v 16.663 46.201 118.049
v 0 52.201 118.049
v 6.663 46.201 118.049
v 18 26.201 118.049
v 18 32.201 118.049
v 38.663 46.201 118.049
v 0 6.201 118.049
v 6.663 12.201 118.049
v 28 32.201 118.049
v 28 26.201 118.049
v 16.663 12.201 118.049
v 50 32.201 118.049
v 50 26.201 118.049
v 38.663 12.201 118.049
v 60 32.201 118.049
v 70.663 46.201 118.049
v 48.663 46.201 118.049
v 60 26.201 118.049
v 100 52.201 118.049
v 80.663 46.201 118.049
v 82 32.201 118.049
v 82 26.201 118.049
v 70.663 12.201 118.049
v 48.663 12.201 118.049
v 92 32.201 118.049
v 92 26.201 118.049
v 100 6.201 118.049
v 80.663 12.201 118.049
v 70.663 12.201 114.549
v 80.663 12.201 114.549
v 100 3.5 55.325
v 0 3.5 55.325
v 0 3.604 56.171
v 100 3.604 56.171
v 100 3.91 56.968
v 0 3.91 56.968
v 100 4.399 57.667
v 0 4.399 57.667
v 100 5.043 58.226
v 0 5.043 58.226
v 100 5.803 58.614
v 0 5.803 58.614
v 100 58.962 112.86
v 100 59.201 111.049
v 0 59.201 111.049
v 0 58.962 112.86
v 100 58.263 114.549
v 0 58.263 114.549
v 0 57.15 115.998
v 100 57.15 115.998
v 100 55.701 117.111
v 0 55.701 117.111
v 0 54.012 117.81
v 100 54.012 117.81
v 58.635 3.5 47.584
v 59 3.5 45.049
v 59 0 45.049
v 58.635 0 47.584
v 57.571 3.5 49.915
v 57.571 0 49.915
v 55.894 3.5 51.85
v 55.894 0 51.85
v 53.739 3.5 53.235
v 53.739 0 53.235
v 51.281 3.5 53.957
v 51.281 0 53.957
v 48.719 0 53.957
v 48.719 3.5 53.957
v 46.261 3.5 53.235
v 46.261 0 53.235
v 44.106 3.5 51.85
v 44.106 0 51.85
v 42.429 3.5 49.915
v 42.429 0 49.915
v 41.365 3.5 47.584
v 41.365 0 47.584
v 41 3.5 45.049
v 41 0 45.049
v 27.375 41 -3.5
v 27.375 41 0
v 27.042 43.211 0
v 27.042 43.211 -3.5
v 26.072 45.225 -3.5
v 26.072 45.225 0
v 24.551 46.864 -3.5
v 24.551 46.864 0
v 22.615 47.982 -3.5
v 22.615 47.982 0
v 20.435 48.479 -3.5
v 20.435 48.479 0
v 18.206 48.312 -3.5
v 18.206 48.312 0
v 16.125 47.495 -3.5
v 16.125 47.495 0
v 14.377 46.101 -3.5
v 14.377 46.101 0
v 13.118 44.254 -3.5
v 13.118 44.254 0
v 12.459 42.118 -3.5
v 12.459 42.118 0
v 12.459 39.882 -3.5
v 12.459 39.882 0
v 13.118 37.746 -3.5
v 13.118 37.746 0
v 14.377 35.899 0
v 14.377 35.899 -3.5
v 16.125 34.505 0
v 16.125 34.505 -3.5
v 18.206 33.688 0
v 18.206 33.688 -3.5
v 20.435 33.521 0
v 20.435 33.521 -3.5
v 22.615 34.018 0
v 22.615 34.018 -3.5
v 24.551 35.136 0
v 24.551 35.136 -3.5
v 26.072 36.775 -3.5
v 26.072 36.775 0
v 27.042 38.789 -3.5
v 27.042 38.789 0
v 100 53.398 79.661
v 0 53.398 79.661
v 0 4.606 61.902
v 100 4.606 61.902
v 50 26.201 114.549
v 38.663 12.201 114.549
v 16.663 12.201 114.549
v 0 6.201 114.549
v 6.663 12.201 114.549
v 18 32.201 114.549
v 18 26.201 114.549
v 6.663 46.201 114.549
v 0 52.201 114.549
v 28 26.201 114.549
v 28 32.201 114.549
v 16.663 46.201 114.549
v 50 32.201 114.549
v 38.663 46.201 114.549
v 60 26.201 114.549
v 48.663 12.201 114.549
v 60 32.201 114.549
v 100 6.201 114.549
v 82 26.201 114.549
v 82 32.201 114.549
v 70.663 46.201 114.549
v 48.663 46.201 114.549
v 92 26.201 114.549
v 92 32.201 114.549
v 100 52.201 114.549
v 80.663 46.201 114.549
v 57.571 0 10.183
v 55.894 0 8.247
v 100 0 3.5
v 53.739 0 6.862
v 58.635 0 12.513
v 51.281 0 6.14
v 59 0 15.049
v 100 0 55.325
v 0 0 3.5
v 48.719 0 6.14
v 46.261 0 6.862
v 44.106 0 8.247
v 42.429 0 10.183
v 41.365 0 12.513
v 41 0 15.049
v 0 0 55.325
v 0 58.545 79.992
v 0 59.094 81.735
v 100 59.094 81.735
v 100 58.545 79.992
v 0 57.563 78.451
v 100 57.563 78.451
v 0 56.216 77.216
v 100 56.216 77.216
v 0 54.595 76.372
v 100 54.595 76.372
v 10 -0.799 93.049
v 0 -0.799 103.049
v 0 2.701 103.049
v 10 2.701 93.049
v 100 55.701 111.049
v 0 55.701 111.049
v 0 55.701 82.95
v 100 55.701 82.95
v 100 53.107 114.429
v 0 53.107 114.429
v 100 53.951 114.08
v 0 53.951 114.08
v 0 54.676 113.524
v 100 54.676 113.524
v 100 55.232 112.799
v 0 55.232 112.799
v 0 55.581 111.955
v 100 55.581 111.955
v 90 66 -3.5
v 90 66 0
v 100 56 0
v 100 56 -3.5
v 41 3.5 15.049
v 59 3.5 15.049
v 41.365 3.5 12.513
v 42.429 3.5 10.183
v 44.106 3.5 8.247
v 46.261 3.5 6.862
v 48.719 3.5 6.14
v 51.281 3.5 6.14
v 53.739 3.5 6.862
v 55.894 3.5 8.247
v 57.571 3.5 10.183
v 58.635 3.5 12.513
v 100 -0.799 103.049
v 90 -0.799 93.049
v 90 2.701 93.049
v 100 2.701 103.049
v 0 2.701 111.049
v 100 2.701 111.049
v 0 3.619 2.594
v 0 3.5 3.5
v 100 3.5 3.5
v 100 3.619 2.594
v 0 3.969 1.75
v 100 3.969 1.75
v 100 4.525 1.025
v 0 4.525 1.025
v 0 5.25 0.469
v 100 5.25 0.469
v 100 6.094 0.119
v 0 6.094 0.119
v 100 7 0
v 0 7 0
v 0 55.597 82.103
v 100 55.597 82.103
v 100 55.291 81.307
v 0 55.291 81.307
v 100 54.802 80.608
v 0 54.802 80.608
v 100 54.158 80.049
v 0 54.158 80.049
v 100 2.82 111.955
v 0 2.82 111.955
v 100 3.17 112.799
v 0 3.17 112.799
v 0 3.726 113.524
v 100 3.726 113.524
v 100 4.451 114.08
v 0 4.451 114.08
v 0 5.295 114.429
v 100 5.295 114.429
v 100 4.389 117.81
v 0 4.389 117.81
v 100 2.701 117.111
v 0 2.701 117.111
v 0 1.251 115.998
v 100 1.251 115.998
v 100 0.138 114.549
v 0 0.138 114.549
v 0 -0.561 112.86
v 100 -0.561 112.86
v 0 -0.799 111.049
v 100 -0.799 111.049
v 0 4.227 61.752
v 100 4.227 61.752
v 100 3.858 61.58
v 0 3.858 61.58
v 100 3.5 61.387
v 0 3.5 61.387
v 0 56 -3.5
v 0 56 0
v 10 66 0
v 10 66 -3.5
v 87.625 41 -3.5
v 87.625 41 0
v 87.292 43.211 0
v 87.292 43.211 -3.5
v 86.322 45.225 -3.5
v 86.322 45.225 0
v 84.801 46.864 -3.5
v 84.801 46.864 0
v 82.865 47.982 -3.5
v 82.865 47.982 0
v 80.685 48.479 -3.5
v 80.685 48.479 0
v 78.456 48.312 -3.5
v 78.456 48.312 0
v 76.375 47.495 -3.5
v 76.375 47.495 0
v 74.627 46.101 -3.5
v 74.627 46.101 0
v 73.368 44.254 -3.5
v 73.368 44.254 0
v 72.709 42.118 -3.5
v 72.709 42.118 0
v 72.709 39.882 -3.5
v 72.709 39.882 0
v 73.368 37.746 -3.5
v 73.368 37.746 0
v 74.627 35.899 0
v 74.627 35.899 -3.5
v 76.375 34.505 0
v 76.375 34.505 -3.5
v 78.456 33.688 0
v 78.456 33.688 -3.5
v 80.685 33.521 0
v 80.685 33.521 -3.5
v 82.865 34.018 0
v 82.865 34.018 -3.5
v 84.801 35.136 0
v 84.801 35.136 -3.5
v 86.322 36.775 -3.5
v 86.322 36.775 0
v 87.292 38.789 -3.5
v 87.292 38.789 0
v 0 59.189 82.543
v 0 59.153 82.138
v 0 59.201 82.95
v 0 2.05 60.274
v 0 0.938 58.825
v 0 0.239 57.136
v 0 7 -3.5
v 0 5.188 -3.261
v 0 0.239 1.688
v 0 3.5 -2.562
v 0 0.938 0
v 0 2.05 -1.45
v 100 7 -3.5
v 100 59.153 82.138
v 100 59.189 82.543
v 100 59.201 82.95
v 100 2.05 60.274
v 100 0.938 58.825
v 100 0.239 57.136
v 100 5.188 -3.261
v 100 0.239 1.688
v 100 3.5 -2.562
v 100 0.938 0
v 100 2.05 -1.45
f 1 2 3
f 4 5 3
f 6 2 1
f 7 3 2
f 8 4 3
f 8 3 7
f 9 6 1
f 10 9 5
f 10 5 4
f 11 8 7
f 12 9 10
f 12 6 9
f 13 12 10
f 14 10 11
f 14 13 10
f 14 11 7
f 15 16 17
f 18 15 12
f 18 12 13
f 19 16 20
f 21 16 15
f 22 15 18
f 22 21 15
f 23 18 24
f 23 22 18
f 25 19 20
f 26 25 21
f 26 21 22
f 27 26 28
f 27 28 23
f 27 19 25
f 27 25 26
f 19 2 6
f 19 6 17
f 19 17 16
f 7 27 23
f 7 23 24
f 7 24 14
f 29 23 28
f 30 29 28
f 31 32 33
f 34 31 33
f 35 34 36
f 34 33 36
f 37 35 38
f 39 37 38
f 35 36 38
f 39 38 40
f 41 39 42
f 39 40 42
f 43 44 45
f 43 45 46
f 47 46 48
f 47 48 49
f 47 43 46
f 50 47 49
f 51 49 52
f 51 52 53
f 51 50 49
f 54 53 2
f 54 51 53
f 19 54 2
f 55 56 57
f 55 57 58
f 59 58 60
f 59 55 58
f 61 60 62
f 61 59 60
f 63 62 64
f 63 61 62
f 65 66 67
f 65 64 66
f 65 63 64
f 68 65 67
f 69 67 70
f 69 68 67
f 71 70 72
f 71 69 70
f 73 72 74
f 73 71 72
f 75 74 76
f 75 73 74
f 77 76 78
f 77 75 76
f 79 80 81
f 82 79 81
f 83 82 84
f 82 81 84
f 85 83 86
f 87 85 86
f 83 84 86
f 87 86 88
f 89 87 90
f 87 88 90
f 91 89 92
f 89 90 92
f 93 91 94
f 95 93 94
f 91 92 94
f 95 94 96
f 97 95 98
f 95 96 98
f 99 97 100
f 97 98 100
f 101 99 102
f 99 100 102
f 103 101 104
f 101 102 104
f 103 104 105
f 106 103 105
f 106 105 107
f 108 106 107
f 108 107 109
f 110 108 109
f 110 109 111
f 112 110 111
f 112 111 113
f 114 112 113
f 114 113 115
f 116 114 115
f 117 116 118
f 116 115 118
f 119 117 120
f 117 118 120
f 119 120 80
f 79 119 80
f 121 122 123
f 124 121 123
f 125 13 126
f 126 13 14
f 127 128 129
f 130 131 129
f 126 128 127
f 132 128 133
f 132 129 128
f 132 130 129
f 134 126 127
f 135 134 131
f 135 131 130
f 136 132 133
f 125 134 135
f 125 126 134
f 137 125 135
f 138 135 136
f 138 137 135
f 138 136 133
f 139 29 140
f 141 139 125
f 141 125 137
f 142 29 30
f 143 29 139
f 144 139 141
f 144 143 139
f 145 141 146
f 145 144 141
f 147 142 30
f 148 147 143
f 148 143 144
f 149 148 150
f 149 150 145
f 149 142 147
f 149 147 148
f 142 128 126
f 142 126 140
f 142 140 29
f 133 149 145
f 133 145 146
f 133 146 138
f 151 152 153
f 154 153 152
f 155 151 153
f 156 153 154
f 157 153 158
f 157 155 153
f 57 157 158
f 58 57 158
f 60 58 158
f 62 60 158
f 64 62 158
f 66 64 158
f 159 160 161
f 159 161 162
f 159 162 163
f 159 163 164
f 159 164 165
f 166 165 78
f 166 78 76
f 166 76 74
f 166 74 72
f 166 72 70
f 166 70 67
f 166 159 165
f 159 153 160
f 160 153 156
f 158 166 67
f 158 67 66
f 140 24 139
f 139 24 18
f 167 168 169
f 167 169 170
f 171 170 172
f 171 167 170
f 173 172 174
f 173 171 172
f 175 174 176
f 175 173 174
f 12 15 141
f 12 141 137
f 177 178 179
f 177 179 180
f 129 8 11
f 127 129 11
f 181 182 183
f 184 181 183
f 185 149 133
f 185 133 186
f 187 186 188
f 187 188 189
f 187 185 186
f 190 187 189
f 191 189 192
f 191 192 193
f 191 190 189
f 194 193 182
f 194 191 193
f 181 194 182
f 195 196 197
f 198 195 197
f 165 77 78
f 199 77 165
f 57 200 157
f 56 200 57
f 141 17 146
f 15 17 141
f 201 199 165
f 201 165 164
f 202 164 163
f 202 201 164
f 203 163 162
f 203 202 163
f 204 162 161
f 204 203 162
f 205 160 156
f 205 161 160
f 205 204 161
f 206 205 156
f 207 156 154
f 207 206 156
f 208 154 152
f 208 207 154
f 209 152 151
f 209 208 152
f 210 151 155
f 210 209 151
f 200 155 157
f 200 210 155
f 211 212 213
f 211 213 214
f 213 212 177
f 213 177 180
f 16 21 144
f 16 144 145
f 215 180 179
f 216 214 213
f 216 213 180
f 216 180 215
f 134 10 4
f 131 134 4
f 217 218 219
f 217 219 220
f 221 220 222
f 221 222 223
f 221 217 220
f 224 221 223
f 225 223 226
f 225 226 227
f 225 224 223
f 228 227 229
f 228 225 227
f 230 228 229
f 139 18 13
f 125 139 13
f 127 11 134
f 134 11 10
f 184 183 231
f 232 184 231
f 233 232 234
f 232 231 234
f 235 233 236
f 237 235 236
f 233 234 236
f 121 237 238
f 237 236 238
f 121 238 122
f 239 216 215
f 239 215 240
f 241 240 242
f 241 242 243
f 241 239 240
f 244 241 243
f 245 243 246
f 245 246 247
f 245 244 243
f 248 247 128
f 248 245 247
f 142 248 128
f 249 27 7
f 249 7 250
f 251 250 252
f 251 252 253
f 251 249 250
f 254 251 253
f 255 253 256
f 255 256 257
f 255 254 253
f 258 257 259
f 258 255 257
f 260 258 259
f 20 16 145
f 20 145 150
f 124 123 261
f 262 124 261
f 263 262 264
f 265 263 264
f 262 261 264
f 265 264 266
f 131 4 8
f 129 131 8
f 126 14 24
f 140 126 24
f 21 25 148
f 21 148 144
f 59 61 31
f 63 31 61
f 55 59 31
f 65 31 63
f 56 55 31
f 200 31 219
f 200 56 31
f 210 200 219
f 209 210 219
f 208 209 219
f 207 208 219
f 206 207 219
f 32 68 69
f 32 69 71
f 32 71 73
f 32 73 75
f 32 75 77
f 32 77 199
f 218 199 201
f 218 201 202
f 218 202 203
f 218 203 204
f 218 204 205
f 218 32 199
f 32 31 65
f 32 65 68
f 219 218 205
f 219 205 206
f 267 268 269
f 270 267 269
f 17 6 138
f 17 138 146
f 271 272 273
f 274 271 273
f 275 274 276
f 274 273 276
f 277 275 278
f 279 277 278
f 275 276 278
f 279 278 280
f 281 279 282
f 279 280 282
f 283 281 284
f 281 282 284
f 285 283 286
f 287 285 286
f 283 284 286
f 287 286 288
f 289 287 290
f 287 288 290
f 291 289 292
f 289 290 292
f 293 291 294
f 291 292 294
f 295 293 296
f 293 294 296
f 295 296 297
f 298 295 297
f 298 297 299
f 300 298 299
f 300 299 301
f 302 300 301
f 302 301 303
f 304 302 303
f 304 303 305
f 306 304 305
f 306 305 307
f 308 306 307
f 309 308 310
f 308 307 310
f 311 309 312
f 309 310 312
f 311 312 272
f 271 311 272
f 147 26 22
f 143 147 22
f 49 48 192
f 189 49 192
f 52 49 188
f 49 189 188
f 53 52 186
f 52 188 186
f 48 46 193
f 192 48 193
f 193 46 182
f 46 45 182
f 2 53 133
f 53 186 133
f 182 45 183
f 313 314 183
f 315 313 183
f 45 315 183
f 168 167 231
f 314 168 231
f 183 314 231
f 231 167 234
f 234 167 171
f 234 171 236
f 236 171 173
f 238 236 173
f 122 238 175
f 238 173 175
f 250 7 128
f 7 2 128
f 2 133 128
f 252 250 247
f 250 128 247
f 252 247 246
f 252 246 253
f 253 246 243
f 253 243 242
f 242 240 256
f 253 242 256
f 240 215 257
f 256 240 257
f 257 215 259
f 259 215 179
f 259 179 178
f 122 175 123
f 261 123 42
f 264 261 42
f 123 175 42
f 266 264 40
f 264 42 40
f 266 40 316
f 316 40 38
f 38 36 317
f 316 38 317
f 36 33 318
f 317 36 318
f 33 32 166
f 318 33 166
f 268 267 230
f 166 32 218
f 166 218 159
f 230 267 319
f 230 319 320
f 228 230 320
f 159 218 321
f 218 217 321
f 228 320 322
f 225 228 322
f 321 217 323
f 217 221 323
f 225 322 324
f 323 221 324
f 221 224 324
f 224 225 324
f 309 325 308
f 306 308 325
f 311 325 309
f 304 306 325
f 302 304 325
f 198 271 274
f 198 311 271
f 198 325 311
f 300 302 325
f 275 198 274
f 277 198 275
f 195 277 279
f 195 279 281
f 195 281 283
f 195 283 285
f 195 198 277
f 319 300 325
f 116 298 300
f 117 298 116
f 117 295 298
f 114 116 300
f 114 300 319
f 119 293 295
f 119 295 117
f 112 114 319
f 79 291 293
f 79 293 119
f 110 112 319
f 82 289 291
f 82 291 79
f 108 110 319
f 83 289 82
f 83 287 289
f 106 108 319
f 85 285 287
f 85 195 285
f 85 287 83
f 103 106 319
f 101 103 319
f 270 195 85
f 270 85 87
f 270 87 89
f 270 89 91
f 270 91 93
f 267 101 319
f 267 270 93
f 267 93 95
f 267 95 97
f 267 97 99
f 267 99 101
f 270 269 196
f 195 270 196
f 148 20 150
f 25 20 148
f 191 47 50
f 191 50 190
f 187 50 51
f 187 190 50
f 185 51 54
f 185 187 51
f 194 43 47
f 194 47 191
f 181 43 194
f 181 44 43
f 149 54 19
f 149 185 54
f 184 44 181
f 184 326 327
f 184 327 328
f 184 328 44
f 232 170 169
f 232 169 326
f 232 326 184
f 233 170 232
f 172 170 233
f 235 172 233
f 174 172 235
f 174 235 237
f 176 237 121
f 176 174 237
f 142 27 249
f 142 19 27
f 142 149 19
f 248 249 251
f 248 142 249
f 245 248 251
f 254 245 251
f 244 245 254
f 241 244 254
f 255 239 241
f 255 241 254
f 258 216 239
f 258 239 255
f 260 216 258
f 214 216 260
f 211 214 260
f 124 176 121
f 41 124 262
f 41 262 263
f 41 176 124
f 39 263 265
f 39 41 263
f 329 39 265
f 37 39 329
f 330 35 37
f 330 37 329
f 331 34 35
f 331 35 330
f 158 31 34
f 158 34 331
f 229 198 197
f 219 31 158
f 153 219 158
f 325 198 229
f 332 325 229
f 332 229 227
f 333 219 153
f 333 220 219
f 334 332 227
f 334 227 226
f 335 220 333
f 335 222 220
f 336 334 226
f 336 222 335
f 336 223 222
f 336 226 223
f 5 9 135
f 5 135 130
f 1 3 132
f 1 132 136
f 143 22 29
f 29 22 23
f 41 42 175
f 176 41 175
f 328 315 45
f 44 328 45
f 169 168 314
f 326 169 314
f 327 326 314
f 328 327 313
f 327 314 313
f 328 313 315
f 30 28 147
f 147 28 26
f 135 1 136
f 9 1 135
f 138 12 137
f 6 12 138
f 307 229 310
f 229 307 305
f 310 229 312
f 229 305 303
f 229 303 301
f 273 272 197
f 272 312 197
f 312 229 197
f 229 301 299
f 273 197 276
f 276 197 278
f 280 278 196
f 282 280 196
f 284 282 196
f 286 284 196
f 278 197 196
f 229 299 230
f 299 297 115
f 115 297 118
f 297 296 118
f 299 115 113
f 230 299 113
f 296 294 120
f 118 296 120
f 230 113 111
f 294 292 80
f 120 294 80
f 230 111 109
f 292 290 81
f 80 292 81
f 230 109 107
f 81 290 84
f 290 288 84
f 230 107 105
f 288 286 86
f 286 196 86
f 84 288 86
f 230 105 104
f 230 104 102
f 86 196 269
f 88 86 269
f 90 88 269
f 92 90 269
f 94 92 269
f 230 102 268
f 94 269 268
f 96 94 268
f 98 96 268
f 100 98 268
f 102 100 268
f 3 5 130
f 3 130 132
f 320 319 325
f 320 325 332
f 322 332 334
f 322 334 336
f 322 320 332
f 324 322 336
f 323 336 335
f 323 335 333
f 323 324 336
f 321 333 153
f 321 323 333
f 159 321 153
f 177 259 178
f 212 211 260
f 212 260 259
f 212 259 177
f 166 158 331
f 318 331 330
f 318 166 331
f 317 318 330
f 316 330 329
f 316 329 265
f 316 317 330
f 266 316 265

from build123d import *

# Parameters (mm, degrees)
SKETCH1_R                    = 7.5
BASE_FLANGE1_DEPTH           = 3.5
EDGE_FLANGE1_STRIP_W         = 21
EDGE_FLANGE1_STRIP_H         = 3.5
EDGE_FLANGE1_STRIP_CUT_DEPTH = 100
EDGE_FLANGE1_DEPTH           = 100
EDGE_FLANGE2_DEPTH           = 100
EDGE_FLANGE2_2_DEPTH         = 100
EDGE_FLANGE3_DEPTH           = 100
EDGE_FLANGE3_2_DEPTH         = 100
EDGE_FLANGE4_STRIP_W         = 21
EDGE_FLANGE4_STRIP_H         = 3.5
EDGE_FLANGE4_STRIP_CUT_DEPTH = 100
EDGE_FLANGE4_DEPTH           = 100
EDGE_FLANGE5_STRIP_W         = 21
EDGE_FLANGE5_STRIP_H         = 3.5
EDGE_FLANGE5_STRIP_CUT_DEPTH = 100
EDGE_FLANGE5_DEPTH           = 100
BREAK_CORNER1_START          = -0.79936489
BREAK_CORNER1_DEPTH          = 3.5
CUT_EXTRUDE1_DEPTH           = 10
CUT_EXTRUDE2_DEPTH           = 10


# Read off the part's stored shape, not the designer's step: Edge-Flange2, Edge-Flange3, Break-Corner1
# Sheet-metal steps are written as plain solids
with BuildPart() as part:
    # Sketch1 → Base-Flange1 (new body)
    with BuildSketch(Plane.XY):
        Polygon((90, 66), (100, 56), (100, 0), (0, 0), (0, 56), (10, 66), align=None)
        with Locations((19.875, 41)):
            Circle(SKETCH1_R, mode=Mode.SUBTRACT)
        with Locations((80.125, 41)):
            Circle(SKETCH1_R, mode=Mode.SUBTRACT)
    extrude(amount=-BASE_FLANGE1_DEPTH)

    # Edge-Flange1 strip (across the edge) → Edge-Flange1 strip cut (cut)
    with BuildSketch(Plane.YZ):
        with Locations((-3.5, -1.75)):
            Rectangle(EDGE_FLANGE1_STRIP_W, EDGE_FLANGE1_STRIP_H)
    extrude(amount=EDGE_FLANGE1_STRIP_CUT_DEPTH, mode=Mode.SUBTRACT)

    # Edge-Flange1 section (across the edge) → Edge-Flange1 (add)
    with BuildSketch(Plane.YZ):
        with BuildLine():
            Line((0, 3.5), (0, 61.5))
            Line((0, 61.5), (3.5, 61.5))
            Line((3.5, 61.5), (3.5, 3.5))
            ThreePointArc((3.5, 3.5), (4.525126266, 1.025126266), (7, 0))
            Line((7, 0), (7, -3.5))
            ThreePointArc((7, -3.5), (2.050252532, -1.449747468), (0, 3.5))
        make_face()
    extrude(amount=EDGE_FLANGE1_DEPTH)

    # Edge-Flange2 outline → Edge-Flange2 (cut)
    with BuildSketch(Plane.YZ):
        with BuildLine():
            ThreePointArc((0, 55.324651413), (0.937822174, 58.824651413), (3.5, 61.386829239))
            Line((3.5, 61.386829239), (3.5, 61.5))
            Line((3.5, 61.5), (0, 61.5))
            Line((0, 61.5), (0, 55.324651413))
        make_face()
    extrude(amount=EDGE_FLANGE2_DEPTH, mode=Mode.SUBTRACT)

    # Edge-Flange2 2 outline → Edge-Flange2 2 (add)
    with BuildSketch(Plane.YZ):
        with BuildLine():
            Line((59.20063511, 81.77337321), (4.605858997, 61.902499758))
            ThreePointArc((4.605858997, 61.902499758), (4.041672168, 61.668805922), (3.5, 61.386829239))
            Line((3.5, 61.386829239), (3.5, 55.324651413))
            ThreePointArc((3.5, 55.324651413), (4.132967845, 57.33216894), (5.802929498, 58.613575585))
            Line((5.802929498, 58.613575585), (60.397705611, 78.484449037))
            Line((60.397705611, 78.484449037), (59.20063511, 81.77337321))
        make_face()
    extrude(amount=EDGE_FLANGE2_2_DEPTH)

    # Edge-Flange3 outline → Edge-Flange3 (cut)
    with BuildSketch(Plane.YZ):
        with BuildLine():
            Line((59.20063511, 81.77337321), (59.094289381, 81.73466653))
            ThreePointArc((59.094289381, 81.73466653), (57.562946212, 78.450690506), (54.594776113, 76.372355428))
            Line((54.594776113, 76.372355428), (60.397705611, 78.484449037))
            Line((60.397705611, 78.484449037), (59.20063511, 81.77337321))
        make_face()
    extrude(amount=EDGE_FLANGE3_DEPTH, mode=Mode.SUBTRACT)

    # Edge-Flange3 2 outline → Edge-Flange3 2 (add)
    with BuildSketch(Plane.YZ):
        with BuildLine():
            ThreePointArc((59.094289381, 81.73466653), (59.173997997, 82.340113574), (59.20063511, 82.950203773))
            Line((59.20063511, 82.950203773), (59.20063511, 118.048751006))
            Line((59.20063511, 118.048751006), (55.70063511, 118.048751006))
            Line((55.70063511, 118.048751006), (55.70063511, 82.950203773))
            ThreePointArc((55.70063511, 82.950203773), (55.067667265, 80.942686246), (53.397705611, 79.661279601))
            Line((53.397705611, 79.661279601), (59.094289381, 81.73466653))
        make_face()
    extrude(amount=EDGE_FLANGE3_2_DEPTH)

    # Edge-Flange4 strip (across the edge) → Edge-Flange4 strip cut (cut)
    with BuildSketch(Plane(origin=(100, 55.70063511, 118.048751006), x_dir=(0, 0, -1), z_dir=(-1, 0, 0))):
        with Locations((-3.5, -1.75)):
            Rectangle(EDGE_FLANGE4_STRIP_W, EDGE_FLANGE4_STRIP_H)
    extrude(amount=EDGE_FLANGE4_STRIP_CUT_DEPTH, mode=Mode.SUBTRACT)

    # Edge-Flange4 section (across the edge) → Edge-Flange4 (add)
    with BuildSketch(Plane(origin=(100, 55.70063511, 118.048751006), x_dir=(0, 0, -1), z_dir=(-1, 0, 0))):
        with BuildLine():
            Line((0, 3.5), (0, 56.5))
            Line((0, 56.5), (3.5, 56.5))
            Line((3.5, 56.5), (3.5, 3.5))
            ThreePointArc((3.5, 3.5), (4.525126266, 1.025126266), (7, 0))
            Line((7, 0), (7, -3.5))
            ThreePointArc((7, -3.5), (2.050252532, -1.449747468), (0, 3.5))
        make_face()
    extrude(amount=EDGE_FLANGE4_DEPTH)

    # Edge-Flange5 strip (across the edge) → Edge-Flange5 strip cut (cut)
    with BuildSketch(Plane(origin=(100, -0.79936489, 114.548751006), x_dir=(0, 1, 0), z_dir=(-1, 0, 0))):
        with Locations((-3.5, -1.75)):
            Rectangle(EDGE_FLANGE5_STRIP_W, EDGE_FLANGE5_STRIP_H)
    extrude(amount=EDGE_FLANGE5_STRIP_CUT_DEPTH, mode=Mode.SUBTRACT)

    # Edge-Flange5 section (across the edge) → Edge-Flange5 (add)
    with BuildSketch(Plane(origin=(100, -0.79936489, 114.548751006), x_dir=(0, 1, 0), z_dir=(-1, 0, 0))):
        with BuildLine():
            Line((0, 3.5), (0, 21.5))
            Line((0, 21.5), (3.5, 21.5))
            Line((3.5, 21.5), (3.5, 3.5))
            ThreePointArc((3.5, 3.5), (4.525126266, 1.025126266), (7, 0))
            Line((7, 0), (7, -3.5))
            ThreePointArc((7, -3.5), (2.050252532, -1.449747468), (0, 3.5))
        make_face()
    extrude(amount=EDGE_FLANGE5_DEPTH)

    # Break-Corner1 outline → Break-Corner1 (cut)
    with BuildSketch(Plane(origin=(0, 0, 0), x_dir=(1, 0, 0), z_dir=(0, 1, 0)).offset(BREAK_CORNER1_START)):
        Polygon((100, -93.048751006), (90, -93.048751006), (100, -103.048751006), align=None)
        Polygon((0, -103.048751006), (10, -93.048751006), (0, -93.048751006), align=None)
    extrude(amount=BREAK_CORNER1_DEPTH, mode=Mode.SUBTRACT)

    # Sketch24 → Cut-Extrude1 (cut)
    with BuildSketch(Plane.XY.offset(118.048751006)):
        Polygon((70.663023535, 46.20063511), (80.663023535, 46.20063511), (92, 32.20063511), (82, 32.20063511), align=None)
        Polygon((38.663023535, 46.20063511), (48.663023535, 46.20063511), (60, 32.20063511), (50, 32.20063511), align=None)
        Polygon((6.663023535, 46.20063511), (16.663023535, 46.20063511), (28, 32.20063511), (18, 32.20063511), align=None)
        Polygon((18, 26.20063511), (6.663023535, 12.20063511), (16.663023535, 12.20063511), (28, 26.20063511), align=None)
        Polygon((50, 26.20063511), (38.663023535, 12.20063511), (48.663023535, 12.20063511), (60, 26.20063511), align=None)
        Polygon((82, 26.20063511), (70.663023535, 12.20063511), (80.663023535, 12.20063511), (92, 26.20063511), align=None)
    extrude(amount=-CUT_EXTRUDE1_DEPTH, mode=Mode.SUBTRACT)

    # Sketch25 → Cut-Extrude2 (cut)
    with BuildSketch(Plane(origin=(0, 3.5, 0), x_dir=(1, 0, 0), z_dir=(0, 1, 0))):
        with BuildLine():
            Line((41, -45.048751006), (41, -15.048751006))
            ThreePointArc((41, -15.048751006), (50, -6.048751006), (59, -15.048751006))
            Line((59, -15.048751006), (59, -45.048751006))
            ThreePointArc((59, -45.048751006), (50, -54.048751006), (41, -45.048751006))
        make_face()
    extrude(amount=-CUT_EXTRUDE2_DEPTH, mode=Mode.SUBTRACT)


solid = part.part
